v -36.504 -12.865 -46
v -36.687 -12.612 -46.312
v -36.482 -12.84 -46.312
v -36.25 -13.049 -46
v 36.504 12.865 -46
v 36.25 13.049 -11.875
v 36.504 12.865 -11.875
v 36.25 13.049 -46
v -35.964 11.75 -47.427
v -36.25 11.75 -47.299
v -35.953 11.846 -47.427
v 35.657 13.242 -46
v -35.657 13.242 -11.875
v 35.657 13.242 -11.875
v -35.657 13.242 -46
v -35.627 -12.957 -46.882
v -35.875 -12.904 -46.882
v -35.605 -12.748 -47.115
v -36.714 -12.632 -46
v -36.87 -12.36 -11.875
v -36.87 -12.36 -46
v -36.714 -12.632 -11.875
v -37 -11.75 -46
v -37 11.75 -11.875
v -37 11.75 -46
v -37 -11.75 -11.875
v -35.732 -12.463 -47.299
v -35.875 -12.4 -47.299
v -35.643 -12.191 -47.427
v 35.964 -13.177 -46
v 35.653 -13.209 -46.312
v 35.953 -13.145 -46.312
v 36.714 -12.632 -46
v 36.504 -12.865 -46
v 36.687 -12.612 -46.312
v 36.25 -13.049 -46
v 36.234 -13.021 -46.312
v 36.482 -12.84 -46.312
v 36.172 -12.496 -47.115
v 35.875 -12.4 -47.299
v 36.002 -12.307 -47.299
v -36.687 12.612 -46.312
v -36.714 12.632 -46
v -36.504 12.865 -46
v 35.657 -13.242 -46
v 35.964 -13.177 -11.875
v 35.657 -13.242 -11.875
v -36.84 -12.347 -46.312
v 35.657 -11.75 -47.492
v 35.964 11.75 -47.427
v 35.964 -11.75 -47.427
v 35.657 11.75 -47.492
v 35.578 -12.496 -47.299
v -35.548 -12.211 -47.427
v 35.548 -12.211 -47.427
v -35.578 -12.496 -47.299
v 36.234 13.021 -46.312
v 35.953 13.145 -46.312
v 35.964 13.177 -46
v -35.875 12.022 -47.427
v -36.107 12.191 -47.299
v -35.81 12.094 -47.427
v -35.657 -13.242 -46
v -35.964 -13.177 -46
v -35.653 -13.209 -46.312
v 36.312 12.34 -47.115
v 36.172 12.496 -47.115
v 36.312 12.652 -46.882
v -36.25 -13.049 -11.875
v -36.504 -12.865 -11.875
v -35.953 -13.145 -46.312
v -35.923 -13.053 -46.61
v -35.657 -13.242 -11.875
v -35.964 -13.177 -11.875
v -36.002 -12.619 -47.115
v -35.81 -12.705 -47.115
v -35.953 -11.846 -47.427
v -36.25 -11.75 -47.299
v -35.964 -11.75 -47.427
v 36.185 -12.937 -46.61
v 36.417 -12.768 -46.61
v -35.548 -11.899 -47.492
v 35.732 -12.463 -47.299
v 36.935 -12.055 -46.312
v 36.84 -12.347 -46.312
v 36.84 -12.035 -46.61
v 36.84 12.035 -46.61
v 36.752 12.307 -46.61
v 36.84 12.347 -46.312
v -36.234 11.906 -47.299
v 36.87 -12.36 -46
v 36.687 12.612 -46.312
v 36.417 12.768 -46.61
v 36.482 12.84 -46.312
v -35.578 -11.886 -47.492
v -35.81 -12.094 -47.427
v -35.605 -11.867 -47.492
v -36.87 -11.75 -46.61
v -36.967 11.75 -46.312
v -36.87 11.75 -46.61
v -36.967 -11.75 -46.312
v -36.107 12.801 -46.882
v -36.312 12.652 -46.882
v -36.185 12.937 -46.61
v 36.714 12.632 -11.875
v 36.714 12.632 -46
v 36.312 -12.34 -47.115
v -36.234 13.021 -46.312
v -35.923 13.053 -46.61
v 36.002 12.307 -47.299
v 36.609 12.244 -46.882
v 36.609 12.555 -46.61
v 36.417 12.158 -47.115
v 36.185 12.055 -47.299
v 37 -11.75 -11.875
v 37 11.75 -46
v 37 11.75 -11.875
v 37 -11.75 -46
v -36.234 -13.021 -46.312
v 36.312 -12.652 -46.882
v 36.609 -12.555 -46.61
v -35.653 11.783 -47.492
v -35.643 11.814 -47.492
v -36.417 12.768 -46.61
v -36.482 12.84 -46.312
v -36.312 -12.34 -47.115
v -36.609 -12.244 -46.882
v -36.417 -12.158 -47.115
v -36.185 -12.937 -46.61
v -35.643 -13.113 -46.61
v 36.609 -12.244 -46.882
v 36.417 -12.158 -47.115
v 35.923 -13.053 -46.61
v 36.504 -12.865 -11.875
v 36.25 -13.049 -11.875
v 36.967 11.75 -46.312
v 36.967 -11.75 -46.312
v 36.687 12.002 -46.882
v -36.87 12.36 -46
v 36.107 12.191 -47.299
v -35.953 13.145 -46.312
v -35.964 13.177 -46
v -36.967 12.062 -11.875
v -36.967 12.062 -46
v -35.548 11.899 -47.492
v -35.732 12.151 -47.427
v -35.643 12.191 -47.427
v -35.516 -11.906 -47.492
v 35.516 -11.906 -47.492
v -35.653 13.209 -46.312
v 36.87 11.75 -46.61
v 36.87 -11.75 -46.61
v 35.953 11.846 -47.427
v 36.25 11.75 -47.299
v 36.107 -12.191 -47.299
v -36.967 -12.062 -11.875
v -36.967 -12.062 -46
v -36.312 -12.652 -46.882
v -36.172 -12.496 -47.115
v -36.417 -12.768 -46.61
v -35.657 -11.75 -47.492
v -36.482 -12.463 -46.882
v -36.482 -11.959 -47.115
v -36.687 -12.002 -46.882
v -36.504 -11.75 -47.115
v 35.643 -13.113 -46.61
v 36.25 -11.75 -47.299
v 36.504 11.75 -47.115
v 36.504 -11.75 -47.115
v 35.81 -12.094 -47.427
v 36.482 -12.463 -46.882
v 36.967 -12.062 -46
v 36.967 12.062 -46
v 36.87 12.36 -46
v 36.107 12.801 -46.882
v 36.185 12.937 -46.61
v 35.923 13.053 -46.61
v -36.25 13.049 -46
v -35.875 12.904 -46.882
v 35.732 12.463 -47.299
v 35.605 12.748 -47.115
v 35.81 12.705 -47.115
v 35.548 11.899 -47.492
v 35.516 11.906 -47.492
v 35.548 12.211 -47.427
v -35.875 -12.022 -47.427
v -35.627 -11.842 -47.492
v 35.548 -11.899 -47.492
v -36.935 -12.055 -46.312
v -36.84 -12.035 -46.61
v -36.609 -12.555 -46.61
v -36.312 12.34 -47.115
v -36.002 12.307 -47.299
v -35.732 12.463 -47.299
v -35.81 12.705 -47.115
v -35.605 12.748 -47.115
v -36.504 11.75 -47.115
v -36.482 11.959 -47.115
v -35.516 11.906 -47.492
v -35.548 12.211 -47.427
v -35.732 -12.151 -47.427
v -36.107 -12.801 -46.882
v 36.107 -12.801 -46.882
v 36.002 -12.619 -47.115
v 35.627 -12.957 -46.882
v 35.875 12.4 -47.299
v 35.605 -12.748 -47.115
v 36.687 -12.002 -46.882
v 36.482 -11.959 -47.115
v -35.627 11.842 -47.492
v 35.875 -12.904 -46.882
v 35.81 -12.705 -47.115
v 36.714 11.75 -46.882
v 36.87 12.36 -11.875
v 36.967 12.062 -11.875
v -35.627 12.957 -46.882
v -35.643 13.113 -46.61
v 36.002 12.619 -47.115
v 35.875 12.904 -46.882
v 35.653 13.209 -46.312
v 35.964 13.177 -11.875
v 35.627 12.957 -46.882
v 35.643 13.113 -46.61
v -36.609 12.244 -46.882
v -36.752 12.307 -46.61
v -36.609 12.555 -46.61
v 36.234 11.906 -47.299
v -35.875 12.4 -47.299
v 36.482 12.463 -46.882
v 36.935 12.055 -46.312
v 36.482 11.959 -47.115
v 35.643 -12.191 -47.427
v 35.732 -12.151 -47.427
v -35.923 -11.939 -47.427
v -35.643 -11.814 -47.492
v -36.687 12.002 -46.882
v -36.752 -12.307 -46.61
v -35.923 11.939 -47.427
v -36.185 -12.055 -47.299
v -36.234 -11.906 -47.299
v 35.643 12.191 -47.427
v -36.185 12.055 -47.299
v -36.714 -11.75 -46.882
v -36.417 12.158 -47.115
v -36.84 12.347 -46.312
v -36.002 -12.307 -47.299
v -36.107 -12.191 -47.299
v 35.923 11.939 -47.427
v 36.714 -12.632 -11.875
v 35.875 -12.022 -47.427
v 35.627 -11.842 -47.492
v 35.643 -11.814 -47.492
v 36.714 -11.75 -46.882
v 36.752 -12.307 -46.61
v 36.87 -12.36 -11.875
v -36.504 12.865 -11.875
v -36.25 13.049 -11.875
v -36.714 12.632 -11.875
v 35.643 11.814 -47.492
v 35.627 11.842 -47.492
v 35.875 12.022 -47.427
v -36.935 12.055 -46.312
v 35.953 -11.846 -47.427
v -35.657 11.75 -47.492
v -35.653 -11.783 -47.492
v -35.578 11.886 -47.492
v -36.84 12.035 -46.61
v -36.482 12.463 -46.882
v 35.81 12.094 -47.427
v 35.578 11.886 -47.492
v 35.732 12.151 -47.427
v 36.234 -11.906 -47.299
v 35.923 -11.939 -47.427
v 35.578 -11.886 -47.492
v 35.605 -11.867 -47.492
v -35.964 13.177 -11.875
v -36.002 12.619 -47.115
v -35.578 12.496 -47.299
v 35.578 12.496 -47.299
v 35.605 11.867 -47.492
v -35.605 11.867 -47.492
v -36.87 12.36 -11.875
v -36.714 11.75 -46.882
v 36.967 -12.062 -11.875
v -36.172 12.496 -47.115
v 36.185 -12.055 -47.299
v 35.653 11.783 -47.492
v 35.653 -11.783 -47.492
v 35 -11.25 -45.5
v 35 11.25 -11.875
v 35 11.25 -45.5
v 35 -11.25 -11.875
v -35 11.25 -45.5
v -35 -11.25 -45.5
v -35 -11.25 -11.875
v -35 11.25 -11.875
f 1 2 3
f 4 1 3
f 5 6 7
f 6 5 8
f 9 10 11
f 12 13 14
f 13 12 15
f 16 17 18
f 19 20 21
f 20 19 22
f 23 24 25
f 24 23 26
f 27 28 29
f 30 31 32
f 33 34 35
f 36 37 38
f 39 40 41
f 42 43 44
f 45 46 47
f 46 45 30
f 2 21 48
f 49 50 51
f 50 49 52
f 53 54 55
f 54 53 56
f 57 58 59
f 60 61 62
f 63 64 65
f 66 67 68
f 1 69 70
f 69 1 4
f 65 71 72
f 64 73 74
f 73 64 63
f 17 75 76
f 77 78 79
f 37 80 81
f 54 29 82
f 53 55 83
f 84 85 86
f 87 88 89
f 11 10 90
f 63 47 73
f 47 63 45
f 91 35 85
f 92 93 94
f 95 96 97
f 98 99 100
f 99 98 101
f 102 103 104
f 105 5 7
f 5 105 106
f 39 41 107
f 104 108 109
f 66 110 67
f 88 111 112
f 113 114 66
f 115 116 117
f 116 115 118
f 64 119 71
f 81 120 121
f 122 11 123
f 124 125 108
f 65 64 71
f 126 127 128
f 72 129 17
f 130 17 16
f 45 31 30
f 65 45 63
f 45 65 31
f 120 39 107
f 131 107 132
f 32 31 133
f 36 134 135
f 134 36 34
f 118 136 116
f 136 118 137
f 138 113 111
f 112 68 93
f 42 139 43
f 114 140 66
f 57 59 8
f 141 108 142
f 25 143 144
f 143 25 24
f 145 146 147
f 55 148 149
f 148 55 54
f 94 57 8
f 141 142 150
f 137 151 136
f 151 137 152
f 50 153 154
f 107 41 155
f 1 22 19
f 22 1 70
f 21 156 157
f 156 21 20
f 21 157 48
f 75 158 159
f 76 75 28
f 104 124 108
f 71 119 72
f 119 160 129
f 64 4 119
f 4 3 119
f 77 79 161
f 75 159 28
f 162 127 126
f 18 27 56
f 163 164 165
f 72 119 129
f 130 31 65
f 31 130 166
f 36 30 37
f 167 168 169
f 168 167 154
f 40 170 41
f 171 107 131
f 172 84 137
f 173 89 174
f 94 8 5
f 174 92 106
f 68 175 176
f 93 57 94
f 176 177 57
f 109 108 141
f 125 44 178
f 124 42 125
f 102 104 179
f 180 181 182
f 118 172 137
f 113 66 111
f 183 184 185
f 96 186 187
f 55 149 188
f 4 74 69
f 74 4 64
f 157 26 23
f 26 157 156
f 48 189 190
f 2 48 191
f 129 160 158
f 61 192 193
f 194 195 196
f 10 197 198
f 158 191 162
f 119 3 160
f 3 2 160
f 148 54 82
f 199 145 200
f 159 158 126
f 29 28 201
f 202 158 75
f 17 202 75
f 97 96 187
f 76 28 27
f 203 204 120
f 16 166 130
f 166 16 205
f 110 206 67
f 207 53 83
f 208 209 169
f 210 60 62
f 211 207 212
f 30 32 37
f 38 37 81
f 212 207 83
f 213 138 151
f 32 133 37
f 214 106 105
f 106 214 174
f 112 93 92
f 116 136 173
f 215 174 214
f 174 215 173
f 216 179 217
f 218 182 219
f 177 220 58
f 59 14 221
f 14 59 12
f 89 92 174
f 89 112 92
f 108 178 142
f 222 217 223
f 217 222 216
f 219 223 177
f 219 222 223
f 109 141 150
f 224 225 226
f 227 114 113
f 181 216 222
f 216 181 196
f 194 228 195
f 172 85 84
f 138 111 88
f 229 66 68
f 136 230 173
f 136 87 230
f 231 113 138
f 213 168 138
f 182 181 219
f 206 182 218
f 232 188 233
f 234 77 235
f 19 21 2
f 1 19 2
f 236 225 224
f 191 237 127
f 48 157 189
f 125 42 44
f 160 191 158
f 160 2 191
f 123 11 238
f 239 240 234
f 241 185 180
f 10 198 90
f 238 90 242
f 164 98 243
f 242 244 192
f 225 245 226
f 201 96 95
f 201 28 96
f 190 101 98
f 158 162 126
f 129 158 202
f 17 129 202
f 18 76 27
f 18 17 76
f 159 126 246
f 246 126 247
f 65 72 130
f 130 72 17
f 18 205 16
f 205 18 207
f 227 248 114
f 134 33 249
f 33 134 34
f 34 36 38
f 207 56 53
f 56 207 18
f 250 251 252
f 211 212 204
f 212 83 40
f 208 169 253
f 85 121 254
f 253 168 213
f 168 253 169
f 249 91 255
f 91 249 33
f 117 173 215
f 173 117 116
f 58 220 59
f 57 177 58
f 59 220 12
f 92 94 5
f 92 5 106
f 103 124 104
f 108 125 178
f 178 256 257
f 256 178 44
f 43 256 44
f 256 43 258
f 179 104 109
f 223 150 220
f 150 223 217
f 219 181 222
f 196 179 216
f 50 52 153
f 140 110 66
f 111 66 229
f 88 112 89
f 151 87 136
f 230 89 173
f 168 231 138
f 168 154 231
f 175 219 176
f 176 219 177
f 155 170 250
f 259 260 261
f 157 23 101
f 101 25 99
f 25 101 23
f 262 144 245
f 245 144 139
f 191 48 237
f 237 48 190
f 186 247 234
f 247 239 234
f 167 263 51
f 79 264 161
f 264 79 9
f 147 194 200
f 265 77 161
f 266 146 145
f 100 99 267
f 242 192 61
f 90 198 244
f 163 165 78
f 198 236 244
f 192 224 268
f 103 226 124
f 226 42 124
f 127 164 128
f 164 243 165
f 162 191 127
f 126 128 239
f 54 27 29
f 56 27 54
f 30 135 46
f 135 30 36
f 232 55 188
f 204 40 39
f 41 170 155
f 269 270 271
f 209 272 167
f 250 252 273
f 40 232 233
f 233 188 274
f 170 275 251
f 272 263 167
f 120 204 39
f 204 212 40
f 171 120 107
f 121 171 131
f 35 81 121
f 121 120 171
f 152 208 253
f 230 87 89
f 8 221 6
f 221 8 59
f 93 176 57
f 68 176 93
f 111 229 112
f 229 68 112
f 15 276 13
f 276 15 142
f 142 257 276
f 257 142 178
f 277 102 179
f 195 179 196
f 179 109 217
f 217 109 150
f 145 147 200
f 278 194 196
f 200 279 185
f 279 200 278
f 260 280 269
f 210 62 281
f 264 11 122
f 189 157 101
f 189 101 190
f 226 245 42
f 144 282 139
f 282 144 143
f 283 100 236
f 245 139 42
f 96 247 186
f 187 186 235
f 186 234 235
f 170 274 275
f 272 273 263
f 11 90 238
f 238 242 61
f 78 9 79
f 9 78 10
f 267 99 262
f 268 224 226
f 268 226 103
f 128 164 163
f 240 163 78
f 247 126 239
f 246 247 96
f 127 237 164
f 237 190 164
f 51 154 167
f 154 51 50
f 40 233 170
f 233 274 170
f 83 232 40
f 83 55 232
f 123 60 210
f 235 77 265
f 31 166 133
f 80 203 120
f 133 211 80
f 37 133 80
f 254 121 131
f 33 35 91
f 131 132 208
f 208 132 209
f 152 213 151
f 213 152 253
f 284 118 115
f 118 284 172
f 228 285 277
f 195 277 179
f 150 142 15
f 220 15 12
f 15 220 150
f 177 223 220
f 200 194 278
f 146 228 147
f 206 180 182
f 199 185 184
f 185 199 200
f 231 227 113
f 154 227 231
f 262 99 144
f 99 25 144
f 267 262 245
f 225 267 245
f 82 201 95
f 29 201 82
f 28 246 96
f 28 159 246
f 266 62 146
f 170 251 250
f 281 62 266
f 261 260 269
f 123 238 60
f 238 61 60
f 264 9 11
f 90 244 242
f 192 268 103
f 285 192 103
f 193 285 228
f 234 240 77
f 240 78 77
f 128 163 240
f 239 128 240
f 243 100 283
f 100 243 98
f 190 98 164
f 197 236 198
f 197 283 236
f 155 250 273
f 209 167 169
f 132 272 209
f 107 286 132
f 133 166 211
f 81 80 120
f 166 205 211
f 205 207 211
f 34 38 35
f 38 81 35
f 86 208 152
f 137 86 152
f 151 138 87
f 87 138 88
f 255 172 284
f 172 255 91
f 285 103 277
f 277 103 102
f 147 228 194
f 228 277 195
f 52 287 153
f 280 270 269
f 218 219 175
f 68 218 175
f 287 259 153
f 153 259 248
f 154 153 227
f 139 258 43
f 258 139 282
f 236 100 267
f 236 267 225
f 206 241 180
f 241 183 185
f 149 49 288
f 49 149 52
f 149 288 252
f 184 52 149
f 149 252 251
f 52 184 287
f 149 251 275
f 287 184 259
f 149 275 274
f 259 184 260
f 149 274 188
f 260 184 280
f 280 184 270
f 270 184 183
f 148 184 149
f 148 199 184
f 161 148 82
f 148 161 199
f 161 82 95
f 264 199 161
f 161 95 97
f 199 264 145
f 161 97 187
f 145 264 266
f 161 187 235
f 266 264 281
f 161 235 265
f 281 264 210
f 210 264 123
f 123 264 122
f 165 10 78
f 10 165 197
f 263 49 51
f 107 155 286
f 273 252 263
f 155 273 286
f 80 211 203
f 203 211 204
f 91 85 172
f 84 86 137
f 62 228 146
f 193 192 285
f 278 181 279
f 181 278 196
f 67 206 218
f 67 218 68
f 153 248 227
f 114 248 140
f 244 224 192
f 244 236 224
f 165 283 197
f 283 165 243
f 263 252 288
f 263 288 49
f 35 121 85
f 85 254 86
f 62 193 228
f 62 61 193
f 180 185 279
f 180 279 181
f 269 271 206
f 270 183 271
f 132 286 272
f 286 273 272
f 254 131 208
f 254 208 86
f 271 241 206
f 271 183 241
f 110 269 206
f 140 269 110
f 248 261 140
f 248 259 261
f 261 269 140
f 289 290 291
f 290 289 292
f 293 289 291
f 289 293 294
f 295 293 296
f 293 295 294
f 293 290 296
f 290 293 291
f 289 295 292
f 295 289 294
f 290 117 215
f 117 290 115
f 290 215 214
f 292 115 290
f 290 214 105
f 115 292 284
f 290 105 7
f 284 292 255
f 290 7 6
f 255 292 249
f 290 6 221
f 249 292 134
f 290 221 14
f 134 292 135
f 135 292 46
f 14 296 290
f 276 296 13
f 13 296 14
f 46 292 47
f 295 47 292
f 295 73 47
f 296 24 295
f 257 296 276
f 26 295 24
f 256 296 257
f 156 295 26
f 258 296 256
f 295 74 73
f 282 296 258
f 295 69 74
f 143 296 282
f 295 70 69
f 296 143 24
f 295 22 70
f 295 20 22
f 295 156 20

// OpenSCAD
// file: ../CustomCardCase.scad
// Units will be interpreted as millimeters.

// What fraction of the case length will be lid?
lid_fraction = 0.25;

// Extra space for a more reasonable fit
card_fit_padding=2;

module _outer_case_shell(shell_dimensions)
{
    $fn=30;
    fillet_radius=1.5;
    minkowski() {
        cube([
            shell_dimensions.x - 2 * fillet_radius,
            shell_dimensions.y - 2 * fillet_radius,
            shell_dimensions.z - 2 * fillet_radius
            ],
            center=true);
        sphere(fillet_radius);
    }
}

// minimum_wall_width should be customized based on printer line width
module custom_card_case_bottom(card_width, card_height, deck_depth, minimum_wall_width=2)
{
    module lid_inset(inner_dimensions, wall_width, overlap_depth)
    {
        linear_extrude(height = overlap_depth, center = true) {
            difference() {
                square([inner_dimensions.x + 2 * wall_width, inner_dimensions.y + 2 * wall_width], center=true);
                square([inner_dimensions.x, inner_dimensions.y], center=true);
            }
        }
    }

    inner_dimensions = [
        card_width + card_fit_padding,
        deck_depth + card_fit_padding,
        card_height + card_fit_padding
    ];

    outer_dimensions = inner_dimensions + [4 * minimum_wall_width, 4 * minimum_wall_width, 2 * minimum_wall_width];

    lid_height = lid_fraction * outer_dimensions.z;
    lid_overlap_depth = 10;

    assert(lid_overlap_depth < lid_height - minimum_wall_width - 4);

    union() {
        difference() {
            _outer_case_shell(outer_dimensions);
            cube(inner_dimensions, center=true);
            translate([0, 0,(outer_dimensions.z / 2) - (lid_height / 2)]) {
                cube([outer_dimensions.x, outer_dimensions.y, lid_height], center=true);
            }
        }
        translate([0, 0, (outer_dimensions.z / 2) - lid_height + (lid_overlap_depth / 2)]) {
            lid_inset(inner_dimensions, minimum_wall_width, lid_overlap_depth);
        }
    }
}

// minimum_wall_width should be customized based on printer line width
module custom_card_case_top(card_width, card_height, deck_depth, minimum_wall_width=2)
{
    inner_dimensions = [
        card_width + card_fit_padding + 2 * minimum_wall_width,
        deck_depth + card_fit_padding + 2 * minimum_wall_width,
        card_height + card_fit_padding
    ];

    outer_dimensions = inner_dimensions + [2 * minimum_wall_width, 2 * minimum_wall_width, 2 * minimum_wall_width];

    lid_height = lid_fraction * outer_dimensions.z;

    union() {
        difference() {
            _outer_case_shell(outer_dimensions);
            cube(inner_dimensions, center=true);
            translate([0, 0, lid_height]) {
                cube([outer_dimensions.x, outer_dimensions.y, outer_dimensions.z - lid_height], center=true);
            }
        }
    }
}
// main file
use <../CustomCardCase.scad>

custom_card_case_top(card_width=64, card_height=89, deck_depth=16.5);
